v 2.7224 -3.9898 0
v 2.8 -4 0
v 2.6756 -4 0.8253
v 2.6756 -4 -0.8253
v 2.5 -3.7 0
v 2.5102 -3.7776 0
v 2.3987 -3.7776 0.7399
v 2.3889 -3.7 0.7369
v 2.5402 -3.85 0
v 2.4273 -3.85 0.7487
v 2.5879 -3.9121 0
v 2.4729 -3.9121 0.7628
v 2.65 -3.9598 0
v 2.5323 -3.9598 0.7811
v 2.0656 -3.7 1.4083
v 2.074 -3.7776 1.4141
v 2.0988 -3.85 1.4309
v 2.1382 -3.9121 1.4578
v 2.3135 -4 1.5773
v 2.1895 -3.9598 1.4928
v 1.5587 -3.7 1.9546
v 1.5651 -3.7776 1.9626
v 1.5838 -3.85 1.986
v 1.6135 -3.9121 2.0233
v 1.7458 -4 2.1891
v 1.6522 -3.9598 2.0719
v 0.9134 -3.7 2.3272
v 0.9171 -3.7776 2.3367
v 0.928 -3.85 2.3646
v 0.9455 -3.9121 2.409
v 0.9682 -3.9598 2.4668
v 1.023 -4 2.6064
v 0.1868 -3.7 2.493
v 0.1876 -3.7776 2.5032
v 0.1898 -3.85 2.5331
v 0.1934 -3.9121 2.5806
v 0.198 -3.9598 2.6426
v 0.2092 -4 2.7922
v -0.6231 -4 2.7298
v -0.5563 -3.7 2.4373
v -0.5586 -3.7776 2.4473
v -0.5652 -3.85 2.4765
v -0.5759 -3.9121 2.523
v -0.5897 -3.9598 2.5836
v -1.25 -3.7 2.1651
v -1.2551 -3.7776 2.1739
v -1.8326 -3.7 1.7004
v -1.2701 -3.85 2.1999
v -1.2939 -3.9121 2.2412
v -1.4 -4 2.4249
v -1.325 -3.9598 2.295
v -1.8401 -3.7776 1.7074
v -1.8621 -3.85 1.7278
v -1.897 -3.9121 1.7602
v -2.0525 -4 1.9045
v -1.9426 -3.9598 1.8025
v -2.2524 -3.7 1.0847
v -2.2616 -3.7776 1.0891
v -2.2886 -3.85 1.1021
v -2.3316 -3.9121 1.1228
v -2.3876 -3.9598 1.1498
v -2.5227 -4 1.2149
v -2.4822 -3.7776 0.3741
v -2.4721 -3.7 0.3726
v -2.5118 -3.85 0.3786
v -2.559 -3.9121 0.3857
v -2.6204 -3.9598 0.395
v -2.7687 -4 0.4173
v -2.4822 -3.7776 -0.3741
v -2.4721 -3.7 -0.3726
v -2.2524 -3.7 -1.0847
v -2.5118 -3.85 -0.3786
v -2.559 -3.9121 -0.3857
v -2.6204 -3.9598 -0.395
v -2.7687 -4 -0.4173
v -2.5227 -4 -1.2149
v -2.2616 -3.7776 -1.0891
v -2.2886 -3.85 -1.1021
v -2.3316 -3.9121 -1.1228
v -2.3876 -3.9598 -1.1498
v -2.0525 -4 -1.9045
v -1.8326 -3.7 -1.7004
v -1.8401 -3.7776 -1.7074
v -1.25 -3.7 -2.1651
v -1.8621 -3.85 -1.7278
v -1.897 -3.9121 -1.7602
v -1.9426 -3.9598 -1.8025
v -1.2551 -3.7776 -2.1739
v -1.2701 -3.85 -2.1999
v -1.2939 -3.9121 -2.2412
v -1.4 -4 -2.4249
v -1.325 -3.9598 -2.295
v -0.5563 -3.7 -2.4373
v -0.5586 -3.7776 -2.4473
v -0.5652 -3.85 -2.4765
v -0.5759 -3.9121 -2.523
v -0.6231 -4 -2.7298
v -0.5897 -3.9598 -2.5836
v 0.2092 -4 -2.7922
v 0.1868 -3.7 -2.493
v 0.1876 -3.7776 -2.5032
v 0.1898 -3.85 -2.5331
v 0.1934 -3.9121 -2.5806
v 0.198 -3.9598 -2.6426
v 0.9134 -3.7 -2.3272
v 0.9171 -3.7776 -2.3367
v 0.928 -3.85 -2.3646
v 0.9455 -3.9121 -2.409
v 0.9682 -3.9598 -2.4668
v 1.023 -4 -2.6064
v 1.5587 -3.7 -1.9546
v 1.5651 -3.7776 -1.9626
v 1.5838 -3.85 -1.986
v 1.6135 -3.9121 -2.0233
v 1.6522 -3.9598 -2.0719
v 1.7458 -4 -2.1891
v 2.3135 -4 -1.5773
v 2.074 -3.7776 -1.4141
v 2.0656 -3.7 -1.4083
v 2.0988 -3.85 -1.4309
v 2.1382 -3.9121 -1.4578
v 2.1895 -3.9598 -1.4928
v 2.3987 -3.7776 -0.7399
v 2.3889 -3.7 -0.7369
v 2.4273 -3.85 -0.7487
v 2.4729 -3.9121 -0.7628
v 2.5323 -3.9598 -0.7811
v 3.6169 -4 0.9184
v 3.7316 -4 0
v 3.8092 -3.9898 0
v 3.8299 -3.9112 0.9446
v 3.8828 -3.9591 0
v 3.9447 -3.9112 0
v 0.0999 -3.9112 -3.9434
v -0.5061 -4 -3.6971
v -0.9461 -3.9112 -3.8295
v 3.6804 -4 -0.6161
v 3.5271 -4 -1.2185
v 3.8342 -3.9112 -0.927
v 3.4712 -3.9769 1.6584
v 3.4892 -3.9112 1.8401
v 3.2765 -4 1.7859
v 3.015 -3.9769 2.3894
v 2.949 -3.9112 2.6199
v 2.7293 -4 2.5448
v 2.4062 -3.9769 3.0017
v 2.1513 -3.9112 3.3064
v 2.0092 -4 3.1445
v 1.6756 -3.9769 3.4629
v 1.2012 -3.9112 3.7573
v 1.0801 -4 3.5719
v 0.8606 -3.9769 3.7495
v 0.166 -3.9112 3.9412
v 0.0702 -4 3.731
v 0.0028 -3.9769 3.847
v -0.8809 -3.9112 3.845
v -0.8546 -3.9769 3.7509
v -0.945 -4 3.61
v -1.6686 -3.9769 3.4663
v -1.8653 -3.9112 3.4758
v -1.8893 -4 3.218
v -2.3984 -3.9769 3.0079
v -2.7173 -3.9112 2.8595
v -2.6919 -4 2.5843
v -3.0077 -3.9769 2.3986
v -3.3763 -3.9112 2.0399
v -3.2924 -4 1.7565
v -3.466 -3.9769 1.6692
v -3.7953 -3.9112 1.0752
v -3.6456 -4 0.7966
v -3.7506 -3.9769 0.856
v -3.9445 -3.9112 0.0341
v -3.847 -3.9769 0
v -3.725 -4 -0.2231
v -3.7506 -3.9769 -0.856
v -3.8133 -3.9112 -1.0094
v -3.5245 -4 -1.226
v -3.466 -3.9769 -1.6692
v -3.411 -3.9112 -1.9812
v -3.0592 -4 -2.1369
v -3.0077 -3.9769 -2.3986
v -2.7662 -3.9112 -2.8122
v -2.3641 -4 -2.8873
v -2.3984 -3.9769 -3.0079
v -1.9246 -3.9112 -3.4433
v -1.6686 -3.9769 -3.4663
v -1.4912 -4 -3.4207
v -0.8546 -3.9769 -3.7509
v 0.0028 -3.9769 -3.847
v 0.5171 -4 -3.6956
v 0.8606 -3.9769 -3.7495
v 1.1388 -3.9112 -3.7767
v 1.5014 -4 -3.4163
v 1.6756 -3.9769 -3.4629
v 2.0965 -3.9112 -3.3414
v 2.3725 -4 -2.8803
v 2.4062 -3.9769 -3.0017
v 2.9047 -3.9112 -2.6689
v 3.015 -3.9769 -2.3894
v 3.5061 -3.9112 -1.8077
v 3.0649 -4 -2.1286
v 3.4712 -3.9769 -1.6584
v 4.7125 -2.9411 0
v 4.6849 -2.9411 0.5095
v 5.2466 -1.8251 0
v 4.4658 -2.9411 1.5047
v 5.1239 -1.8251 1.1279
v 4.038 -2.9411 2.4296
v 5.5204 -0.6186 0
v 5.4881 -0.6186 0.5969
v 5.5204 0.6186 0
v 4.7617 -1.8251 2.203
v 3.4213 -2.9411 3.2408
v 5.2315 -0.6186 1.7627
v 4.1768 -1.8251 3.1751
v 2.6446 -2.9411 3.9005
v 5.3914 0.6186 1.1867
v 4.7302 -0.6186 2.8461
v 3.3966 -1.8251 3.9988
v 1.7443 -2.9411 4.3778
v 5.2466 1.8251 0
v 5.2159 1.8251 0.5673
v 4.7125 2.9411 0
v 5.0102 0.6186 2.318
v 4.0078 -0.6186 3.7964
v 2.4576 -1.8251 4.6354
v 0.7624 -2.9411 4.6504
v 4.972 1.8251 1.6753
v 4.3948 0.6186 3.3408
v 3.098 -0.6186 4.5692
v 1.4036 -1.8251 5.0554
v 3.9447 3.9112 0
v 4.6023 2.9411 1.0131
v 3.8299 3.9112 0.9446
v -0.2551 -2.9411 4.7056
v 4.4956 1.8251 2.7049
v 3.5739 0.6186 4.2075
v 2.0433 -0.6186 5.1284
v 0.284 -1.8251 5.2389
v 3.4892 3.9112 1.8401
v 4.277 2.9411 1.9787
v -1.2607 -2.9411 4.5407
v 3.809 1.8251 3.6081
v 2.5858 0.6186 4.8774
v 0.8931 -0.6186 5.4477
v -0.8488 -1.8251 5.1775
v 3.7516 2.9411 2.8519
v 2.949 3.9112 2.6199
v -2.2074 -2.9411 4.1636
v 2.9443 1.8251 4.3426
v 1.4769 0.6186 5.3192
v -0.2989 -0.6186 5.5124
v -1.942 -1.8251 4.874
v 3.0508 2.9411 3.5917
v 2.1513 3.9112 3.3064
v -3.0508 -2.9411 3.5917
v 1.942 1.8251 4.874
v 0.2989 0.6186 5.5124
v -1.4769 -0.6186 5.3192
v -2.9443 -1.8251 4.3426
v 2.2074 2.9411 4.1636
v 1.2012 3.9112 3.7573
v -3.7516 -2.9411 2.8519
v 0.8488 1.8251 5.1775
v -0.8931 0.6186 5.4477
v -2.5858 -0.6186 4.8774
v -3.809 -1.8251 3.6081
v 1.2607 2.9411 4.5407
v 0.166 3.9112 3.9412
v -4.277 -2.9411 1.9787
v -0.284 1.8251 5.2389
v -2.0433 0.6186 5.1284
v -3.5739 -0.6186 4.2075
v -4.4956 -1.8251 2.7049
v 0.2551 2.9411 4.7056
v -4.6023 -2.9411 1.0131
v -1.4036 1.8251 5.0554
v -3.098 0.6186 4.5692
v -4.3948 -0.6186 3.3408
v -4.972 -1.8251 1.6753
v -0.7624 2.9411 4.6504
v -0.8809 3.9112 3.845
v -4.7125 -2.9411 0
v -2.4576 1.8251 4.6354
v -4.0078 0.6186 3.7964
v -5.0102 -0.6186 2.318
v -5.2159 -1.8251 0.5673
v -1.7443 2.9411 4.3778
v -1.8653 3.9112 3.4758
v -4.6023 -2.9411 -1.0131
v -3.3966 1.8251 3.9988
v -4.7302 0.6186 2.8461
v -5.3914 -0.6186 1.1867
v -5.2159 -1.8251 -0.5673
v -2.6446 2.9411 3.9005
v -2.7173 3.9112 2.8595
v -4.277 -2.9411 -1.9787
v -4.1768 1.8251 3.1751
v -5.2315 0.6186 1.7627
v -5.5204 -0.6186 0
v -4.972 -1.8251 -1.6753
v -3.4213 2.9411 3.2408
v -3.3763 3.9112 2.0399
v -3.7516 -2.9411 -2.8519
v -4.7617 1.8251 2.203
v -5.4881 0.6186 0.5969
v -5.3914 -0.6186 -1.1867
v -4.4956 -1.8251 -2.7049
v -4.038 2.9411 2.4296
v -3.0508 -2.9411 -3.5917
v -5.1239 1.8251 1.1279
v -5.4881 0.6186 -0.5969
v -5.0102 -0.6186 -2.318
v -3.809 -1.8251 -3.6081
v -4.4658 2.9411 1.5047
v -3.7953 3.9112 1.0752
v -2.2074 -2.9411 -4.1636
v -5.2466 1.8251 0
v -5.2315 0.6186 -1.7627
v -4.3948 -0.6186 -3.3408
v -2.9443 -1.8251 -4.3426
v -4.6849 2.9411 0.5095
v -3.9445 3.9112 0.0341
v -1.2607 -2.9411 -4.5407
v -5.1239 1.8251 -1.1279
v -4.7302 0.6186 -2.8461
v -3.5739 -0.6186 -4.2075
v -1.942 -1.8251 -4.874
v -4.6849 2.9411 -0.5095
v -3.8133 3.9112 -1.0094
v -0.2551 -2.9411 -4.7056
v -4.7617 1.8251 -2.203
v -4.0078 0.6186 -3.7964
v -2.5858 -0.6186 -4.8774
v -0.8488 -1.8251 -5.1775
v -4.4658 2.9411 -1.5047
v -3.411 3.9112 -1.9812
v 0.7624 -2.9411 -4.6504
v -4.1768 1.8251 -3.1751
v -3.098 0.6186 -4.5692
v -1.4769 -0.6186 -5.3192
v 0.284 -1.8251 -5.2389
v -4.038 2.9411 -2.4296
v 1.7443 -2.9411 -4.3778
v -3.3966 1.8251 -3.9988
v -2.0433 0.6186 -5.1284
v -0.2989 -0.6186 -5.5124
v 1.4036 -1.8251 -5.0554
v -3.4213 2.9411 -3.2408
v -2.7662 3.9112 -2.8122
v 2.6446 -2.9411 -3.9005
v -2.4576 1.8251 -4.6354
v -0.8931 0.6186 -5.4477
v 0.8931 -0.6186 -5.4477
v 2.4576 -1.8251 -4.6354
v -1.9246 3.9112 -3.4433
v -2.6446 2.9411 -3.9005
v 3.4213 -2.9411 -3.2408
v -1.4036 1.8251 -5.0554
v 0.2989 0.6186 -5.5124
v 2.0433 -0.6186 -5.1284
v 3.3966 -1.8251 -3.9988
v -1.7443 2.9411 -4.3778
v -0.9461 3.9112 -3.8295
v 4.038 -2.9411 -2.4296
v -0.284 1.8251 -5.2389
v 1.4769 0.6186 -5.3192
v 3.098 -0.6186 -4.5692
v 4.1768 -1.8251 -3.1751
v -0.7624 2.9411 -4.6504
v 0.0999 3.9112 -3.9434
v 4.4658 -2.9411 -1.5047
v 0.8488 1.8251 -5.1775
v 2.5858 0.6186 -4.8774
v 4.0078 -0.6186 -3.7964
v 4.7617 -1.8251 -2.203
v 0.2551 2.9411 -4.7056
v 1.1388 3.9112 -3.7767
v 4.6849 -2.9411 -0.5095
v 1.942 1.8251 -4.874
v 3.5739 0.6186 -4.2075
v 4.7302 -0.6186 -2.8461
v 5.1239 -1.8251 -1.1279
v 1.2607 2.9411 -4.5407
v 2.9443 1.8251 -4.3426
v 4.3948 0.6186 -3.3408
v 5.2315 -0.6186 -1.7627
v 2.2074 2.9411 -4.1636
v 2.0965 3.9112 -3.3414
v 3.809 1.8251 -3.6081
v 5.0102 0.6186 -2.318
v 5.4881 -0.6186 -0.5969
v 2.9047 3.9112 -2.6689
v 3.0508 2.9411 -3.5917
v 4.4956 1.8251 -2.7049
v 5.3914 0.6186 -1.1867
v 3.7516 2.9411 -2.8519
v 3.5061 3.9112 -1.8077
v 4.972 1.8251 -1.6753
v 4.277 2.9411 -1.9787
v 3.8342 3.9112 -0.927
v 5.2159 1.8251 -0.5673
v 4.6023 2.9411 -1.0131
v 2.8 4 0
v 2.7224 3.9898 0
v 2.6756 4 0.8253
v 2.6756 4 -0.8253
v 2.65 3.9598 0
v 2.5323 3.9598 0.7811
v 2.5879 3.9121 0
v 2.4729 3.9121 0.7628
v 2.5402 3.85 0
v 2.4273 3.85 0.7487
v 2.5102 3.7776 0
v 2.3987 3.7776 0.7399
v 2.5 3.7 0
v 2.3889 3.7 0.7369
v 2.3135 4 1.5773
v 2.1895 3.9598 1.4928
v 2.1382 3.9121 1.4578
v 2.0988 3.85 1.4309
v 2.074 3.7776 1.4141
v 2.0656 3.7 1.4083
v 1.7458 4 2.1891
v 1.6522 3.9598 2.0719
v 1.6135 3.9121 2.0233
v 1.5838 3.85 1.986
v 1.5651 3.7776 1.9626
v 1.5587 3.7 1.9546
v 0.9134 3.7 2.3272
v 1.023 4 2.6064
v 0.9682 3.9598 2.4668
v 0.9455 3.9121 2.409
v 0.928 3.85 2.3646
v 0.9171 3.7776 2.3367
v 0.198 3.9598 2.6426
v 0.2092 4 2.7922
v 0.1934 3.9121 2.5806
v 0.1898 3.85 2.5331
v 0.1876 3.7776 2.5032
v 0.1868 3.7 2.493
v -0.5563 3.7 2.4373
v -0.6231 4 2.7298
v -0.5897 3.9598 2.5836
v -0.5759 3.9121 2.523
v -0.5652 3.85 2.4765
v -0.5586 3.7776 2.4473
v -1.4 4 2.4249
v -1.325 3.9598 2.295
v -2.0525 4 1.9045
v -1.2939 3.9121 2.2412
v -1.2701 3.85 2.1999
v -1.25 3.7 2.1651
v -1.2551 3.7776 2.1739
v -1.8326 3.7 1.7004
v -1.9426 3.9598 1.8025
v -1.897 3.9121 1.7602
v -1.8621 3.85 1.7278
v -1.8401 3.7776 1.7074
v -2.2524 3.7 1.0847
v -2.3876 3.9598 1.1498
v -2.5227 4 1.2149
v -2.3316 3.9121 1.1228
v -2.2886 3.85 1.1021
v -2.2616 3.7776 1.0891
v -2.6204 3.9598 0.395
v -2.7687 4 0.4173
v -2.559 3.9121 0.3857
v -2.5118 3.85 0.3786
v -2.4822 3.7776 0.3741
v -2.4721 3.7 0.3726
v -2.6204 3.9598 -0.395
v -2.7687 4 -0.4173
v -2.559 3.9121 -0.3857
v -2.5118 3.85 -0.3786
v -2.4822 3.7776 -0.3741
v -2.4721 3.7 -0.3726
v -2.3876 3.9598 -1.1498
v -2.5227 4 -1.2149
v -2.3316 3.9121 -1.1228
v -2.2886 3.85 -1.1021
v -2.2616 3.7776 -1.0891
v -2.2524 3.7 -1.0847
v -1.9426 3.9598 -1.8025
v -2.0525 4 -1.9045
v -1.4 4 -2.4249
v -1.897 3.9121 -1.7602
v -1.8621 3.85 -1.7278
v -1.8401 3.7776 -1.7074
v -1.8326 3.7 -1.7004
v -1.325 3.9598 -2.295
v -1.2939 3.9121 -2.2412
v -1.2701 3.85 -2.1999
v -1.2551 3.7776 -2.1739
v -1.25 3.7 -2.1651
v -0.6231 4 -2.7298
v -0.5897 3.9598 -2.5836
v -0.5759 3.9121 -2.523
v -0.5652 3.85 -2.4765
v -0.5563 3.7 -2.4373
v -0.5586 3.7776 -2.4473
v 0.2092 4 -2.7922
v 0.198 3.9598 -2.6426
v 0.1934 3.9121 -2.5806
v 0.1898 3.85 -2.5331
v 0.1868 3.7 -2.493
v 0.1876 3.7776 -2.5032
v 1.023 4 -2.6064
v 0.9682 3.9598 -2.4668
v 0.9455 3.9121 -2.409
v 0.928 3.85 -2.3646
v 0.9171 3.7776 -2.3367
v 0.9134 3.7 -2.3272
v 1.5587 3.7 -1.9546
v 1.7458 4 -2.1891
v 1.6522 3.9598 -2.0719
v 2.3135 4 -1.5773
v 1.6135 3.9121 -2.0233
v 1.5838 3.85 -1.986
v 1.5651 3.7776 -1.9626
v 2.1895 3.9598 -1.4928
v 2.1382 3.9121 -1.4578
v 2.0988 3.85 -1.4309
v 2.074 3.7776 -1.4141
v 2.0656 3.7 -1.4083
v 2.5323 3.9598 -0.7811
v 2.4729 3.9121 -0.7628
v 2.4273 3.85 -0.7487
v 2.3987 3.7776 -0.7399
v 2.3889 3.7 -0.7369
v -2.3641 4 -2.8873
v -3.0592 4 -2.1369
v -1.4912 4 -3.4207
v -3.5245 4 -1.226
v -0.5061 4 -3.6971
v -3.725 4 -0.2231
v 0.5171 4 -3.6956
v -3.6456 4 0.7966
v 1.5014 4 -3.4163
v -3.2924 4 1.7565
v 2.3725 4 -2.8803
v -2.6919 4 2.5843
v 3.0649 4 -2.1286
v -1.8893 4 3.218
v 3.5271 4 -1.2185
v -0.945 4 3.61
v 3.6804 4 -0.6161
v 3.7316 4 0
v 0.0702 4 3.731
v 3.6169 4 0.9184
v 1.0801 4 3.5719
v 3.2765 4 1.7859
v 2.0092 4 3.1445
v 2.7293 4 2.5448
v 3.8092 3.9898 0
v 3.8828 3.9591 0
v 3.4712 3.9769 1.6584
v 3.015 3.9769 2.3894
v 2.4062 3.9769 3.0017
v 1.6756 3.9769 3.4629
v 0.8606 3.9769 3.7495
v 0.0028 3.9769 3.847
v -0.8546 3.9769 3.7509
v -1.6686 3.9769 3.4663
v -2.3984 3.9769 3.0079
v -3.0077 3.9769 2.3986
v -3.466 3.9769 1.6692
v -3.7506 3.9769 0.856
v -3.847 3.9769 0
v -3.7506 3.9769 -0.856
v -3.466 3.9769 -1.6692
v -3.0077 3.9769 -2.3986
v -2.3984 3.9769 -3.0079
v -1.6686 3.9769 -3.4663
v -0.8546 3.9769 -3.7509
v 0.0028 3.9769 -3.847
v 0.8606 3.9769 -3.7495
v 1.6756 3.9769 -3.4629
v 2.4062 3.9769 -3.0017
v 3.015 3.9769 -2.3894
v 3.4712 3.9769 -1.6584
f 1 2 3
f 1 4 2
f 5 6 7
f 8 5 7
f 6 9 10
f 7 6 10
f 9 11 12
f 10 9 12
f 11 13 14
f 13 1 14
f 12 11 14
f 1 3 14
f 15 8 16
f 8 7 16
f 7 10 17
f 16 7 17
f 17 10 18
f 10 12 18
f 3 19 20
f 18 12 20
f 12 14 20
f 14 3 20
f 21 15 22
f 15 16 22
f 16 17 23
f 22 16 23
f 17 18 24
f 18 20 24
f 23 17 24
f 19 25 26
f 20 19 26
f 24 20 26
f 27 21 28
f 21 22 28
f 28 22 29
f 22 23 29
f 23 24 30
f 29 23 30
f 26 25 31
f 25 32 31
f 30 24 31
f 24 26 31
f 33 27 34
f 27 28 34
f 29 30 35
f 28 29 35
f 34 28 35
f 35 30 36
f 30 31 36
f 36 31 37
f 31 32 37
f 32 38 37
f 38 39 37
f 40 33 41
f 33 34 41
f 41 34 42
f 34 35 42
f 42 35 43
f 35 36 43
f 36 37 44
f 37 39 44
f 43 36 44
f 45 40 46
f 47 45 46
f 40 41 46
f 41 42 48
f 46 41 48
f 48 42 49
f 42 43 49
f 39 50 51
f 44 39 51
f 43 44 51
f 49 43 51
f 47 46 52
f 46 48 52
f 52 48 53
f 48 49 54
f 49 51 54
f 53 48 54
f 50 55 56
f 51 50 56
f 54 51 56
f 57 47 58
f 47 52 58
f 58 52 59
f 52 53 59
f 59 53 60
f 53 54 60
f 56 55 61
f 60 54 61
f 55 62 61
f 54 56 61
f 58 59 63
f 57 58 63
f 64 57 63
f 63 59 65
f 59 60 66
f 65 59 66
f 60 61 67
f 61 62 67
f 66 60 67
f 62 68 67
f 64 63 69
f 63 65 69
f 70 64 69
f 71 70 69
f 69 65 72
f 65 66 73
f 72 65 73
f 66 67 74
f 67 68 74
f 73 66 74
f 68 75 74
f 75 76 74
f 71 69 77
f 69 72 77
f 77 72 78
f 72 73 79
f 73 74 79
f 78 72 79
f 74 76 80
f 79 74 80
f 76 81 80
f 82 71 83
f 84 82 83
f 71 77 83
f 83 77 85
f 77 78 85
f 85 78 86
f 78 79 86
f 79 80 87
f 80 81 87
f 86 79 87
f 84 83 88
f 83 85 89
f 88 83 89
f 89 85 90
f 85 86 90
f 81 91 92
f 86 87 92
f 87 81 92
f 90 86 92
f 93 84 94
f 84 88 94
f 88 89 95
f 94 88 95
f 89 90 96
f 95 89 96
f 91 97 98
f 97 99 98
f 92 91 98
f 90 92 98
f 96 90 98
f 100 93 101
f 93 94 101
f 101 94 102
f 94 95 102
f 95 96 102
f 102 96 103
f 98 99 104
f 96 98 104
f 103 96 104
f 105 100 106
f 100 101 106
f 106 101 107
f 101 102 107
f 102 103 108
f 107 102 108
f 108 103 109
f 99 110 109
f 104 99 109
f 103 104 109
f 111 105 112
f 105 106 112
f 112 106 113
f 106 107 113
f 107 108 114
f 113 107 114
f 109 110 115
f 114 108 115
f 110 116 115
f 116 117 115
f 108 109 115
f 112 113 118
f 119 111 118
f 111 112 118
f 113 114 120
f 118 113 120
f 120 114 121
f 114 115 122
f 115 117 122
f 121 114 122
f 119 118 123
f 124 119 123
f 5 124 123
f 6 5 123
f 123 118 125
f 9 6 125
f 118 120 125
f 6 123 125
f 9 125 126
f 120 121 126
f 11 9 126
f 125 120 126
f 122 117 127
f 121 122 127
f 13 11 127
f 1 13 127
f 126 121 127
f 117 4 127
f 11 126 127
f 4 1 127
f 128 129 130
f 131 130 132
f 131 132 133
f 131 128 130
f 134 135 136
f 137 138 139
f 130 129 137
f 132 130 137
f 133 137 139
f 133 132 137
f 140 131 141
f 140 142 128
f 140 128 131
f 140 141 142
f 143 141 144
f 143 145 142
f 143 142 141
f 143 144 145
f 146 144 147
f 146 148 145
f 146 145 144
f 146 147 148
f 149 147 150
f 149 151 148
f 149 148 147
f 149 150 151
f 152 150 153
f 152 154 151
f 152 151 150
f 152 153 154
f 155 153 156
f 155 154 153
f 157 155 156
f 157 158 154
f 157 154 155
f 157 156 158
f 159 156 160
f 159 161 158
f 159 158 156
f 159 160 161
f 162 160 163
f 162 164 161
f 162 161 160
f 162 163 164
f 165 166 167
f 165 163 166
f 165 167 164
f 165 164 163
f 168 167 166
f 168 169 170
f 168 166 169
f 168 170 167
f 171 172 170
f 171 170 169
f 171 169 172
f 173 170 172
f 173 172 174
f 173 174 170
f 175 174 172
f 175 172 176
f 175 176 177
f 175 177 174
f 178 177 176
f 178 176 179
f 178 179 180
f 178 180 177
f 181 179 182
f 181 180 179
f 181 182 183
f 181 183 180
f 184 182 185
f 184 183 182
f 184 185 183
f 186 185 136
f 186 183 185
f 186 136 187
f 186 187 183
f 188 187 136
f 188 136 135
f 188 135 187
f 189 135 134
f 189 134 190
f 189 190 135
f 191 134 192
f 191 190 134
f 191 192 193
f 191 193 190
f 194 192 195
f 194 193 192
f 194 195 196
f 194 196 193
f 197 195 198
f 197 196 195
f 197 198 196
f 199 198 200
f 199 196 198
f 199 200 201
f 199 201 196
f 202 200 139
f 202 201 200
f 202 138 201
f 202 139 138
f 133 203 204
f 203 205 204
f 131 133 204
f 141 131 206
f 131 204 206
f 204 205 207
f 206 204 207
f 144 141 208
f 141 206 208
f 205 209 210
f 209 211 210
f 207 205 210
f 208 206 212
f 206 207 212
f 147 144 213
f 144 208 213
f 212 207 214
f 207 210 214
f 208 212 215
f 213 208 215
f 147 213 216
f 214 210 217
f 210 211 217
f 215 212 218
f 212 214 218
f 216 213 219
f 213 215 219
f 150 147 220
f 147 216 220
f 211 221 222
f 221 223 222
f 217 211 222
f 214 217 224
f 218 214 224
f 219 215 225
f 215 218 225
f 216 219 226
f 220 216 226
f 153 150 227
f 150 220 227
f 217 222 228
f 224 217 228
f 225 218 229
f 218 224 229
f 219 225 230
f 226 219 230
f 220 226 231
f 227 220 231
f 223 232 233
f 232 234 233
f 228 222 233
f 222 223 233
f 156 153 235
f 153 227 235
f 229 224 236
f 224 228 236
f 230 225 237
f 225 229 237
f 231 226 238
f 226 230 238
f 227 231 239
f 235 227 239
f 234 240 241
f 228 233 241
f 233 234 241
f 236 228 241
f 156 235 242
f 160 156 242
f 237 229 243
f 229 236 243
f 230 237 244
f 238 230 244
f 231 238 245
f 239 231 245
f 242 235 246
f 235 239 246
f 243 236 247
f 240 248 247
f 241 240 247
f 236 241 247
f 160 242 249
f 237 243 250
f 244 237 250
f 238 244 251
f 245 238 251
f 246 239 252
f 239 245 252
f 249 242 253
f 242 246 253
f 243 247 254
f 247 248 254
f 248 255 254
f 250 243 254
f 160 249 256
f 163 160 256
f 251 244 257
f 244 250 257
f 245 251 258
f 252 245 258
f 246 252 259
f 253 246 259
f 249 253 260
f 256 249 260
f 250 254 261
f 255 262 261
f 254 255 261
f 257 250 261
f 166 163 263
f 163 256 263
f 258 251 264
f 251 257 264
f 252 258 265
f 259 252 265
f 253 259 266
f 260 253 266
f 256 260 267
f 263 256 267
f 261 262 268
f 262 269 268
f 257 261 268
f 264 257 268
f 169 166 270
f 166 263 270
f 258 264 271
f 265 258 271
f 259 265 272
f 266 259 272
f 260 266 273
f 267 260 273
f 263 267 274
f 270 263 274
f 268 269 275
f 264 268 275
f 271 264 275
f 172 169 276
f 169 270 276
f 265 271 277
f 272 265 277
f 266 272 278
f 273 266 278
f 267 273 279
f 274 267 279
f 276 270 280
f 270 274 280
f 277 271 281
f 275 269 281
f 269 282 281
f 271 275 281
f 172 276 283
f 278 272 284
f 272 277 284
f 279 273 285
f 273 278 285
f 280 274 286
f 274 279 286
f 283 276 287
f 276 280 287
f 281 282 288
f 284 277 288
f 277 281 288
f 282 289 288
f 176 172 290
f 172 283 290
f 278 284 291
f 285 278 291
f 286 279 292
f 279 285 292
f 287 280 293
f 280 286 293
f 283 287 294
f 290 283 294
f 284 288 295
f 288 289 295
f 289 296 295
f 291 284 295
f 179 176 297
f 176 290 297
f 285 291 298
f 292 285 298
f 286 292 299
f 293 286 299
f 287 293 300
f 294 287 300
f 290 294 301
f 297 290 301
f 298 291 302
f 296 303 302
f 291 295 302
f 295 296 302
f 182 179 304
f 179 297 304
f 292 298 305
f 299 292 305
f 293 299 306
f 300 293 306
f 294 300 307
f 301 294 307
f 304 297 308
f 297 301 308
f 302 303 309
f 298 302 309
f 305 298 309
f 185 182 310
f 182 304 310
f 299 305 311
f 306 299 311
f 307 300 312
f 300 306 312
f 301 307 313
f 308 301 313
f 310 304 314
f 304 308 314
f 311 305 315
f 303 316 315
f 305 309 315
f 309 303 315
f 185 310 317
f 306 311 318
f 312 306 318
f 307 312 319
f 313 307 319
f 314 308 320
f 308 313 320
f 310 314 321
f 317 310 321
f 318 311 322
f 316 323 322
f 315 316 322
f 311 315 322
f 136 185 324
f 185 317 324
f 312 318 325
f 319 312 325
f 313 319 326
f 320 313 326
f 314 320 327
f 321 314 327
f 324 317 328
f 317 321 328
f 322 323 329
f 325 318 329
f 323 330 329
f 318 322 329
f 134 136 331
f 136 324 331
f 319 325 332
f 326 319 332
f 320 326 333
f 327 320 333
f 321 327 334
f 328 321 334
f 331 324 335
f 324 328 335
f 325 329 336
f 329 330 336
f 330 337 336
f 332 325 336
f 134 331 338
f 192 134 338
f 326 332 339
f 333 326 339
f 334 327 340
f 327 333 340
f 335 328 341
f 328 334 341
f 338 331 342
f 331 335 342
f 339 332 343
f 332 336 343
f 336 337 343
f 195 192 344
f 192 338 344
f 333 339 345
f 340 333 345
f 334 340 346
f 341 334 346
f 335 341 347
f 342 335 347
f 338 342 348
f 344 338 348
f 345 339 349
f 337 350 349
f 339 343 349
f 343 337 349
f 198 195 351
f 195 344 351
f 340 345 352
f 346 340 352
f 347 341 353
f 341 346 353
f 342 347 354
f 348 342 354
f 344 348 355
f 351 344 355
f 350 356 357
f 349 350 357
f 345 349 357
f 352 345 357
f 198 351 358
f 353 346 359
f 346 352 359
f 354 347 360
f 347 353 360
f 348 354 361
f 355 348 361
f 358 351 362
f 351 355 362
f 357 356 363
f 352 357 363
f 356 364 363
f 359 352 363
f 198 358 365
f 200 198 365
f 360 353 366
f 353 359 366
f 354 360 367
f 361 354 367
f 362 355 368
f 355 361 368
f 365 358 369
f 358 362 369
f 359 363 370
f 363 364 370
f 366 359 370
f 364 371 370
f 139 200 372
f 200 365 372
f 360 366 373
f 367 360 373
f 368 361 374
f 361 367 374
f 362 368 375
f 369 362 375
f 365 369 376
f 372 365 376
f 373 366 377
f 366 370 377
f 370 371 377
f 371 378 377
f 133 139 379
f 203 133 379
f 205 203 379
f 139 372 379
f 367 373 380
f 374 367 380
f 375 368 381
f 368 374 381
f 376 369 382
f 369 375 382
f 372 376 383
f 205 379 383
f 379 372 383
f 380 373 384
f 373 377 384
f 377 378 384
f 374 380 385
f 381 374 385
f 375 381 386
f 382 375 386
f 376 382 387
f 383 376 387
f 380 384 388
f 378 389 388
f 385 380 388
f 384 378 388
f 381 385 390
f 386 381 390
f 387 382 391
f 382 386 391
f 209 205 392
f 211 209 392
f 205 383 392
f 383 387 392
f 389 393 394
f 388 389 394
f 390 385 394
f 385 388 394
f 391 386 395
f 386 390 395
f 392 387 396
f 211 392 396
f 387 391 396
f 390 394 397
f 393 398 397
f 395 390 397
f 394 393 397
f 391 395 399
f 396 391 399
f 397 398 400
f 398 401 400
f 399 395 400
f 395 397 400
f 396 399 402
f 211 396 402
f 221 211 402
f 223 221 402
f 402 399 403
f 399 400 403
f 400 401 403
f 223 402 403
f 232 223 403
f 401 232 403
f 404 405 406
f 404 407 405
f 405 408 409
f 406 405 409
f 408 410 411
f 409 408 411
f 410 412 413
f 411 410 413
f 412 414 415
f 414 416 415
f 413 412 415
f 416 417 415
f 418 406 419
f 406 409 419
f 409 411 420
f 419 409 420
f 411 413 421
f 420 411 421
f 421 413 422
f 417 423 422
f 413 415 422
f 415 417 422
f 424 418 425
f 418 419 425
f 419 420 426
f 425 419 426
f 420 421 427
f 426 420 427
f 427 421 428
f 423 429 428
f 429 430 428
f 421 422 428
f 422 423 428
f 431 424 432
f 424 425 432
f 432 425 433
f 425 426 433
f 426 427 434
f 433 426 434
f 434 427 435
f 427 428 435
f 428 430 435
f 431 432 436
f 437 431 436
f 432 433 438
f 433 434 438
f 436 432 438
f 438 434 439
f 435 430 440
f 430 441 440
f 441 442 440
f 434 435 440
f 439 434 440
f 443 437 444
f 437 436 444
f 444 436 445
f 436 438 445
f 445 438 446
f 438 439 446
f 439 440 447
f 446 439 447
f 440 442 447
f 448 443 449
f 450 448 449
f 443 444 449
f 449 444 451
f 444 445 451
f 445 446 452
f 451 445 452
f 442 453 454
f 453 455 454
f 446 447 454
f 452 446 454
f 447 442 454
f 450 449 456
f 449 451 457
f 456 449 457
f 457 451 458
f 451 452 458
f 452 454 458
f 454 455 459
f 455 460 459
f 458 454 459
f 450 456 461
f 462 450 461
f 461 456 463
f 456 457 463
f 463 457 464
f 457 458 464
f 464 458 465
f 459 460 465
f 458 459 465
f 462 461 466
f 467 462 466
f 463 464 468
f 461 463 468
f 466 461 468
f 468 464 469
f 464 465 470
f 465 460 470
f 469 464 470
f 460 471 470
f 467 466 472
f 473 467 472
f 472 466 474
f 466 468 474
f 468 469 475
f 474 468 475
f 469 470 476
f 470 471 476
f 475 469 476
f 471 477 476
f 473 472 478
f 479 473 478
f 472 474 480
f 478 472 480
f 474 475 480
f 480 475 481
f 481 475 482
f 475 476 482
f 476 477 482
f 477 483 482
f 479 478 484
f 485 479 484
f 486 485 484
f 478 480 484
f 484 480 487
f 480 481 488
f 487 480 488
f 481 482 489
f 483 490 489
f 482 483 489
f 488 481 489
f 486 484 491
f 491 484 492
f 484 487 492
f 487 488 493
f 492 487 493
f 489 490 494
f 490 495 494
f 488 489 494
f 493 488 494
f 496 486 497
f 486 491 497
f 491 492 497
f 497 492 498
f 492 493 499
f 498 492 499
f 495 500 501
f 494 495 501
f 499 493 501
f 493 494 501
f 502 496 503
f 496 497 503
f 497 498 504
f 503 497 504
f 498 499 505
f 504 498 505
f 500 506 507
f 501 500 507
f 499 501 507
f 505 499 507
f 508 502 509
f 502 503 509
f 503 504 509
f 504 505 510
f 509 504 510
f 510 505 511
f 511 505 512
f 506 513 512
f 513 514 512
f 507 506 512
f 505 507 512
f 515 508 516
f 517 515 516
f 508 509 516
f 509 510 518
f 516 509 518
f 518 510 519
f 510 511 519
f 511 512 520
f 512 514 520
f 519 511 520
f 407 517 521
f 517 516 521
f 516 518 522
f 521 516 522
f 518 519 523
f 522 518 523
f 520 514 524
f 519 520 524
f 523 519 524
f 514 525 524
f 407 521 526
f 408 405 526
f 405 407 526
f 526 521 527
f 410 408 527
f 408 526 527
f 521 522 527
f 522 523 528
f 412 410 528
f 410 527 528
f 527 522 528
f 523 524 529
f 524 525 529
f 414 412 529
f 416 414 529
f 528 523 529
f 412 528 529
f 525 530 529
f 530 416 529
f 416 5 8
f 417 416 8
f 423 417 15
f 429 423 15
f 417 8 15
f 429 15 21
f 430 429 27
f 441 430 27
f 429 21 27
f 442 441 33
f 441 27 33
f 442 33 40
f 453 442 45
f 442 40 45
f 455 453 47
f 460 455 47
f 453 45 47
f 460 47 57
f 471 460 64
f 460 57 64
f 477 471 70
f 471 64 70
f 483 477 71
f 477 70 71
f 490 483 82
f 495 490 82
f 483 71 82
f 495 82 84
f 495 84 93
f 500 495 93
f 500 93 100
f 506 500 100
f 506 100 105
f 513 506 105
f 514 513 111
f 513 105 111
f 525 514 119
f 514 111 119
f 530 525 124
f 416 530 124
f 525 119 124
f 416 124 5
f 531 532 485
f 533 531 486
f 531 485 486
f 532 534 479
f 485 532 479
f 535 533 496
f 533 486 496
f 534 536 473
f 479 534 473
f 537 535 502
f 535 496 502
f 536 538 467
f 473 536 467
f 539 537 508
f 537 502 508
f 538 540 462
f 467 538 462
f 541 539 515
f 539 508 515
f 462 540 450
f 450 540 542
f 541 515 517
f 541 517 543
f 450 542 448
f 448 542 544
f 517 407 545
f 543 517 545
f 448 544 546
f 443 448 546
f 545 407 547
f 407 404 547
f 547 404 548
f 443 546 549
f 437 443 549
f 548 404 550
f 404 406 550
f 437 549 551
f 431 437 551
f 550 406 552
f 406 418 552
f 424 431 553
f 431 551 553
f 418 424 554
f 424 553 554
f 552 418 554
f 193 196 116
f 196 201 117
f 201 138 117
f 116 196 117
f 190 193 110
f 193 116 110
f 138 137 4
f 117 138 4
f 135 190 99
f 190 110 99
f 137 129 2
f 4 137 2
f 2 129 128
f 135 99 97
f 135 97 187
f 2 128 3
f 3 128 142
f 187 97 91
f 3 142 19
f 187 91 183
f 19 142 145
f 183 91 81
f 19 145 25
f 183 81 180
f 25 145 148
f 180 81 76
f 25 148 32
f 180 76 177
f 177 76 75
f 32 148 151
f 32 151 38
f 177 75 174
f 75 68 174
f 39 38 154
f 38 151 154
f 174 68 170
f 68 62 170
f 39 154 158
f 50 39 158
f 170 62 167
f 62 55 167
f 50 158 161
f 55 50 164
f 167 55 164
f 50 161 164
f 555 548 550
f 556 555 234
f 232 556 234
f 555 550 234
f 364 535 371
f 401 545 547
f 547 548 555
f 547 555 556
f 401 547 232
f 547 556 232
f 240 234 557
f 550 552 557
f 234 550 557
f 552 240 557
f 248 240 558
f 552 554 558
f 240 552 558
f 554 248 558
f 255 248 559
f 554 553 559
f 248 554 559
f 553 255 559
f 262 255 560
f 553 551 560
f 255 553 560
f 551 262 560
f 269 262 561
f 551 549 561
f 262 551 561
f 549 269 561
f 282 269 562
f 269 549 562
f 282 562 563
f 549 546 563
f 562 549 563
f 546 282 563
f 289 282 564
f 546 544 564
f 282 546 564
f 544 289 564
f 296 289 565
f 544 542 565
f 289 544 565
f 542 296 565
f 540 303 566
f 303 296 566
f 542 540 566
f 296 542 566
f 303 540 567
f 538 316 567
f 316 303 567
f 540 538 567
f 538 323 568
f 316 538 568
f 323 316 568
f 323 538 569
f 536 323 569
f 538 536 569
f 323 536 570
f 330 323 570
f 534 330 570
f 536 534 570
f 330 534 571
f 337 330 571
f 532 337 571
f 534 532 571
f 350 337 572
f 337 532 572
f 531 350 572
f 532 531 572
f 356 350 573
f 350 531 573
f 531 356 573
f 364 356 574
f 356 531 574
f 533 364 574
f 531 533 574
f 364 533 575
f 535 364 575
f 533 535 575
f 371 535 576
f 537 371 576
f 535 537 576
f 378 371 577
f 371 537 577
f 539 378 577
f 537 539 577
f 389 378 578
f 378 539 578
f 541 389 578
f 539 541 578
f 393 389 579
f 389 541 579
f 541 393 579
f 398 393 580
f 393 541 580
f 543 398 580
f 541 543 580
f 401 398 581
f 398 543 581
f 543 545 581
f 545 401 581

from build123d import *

# Parameters (mm, degrees)
FILLET1_R = 0.3


with BuildPart() as part:
    # Sketch1 → Revolve1 (revolve)
    with BuildSketch(Plane.XY):
        with BuildLine():
            Line((3.854610875, 4), (2.5, 4))
            Line((2.5, 4), (2.5, -4))
            Line((2.5, -4), (3.854610875, -4))
            ThreePointArc((3.854610875, -4), (5.555, 0), (3.854610875, 4))
        make_face()
    revolve(axis=Axis((0, 4, 0), (0, -1, 0)))

    # Fillet1
    fillet1_edges = [part.edges().sort_by_distance(p)[0] for p in [
        (-3.854610875, -4, 0),
        (-2.5, -4, 0),
        (-2.5, 4, 0),
        (-3.854610875, 4, 0),
    ]]
    fillet(fillet1_edges, radius=FILLET1_R)


solid = part.part
